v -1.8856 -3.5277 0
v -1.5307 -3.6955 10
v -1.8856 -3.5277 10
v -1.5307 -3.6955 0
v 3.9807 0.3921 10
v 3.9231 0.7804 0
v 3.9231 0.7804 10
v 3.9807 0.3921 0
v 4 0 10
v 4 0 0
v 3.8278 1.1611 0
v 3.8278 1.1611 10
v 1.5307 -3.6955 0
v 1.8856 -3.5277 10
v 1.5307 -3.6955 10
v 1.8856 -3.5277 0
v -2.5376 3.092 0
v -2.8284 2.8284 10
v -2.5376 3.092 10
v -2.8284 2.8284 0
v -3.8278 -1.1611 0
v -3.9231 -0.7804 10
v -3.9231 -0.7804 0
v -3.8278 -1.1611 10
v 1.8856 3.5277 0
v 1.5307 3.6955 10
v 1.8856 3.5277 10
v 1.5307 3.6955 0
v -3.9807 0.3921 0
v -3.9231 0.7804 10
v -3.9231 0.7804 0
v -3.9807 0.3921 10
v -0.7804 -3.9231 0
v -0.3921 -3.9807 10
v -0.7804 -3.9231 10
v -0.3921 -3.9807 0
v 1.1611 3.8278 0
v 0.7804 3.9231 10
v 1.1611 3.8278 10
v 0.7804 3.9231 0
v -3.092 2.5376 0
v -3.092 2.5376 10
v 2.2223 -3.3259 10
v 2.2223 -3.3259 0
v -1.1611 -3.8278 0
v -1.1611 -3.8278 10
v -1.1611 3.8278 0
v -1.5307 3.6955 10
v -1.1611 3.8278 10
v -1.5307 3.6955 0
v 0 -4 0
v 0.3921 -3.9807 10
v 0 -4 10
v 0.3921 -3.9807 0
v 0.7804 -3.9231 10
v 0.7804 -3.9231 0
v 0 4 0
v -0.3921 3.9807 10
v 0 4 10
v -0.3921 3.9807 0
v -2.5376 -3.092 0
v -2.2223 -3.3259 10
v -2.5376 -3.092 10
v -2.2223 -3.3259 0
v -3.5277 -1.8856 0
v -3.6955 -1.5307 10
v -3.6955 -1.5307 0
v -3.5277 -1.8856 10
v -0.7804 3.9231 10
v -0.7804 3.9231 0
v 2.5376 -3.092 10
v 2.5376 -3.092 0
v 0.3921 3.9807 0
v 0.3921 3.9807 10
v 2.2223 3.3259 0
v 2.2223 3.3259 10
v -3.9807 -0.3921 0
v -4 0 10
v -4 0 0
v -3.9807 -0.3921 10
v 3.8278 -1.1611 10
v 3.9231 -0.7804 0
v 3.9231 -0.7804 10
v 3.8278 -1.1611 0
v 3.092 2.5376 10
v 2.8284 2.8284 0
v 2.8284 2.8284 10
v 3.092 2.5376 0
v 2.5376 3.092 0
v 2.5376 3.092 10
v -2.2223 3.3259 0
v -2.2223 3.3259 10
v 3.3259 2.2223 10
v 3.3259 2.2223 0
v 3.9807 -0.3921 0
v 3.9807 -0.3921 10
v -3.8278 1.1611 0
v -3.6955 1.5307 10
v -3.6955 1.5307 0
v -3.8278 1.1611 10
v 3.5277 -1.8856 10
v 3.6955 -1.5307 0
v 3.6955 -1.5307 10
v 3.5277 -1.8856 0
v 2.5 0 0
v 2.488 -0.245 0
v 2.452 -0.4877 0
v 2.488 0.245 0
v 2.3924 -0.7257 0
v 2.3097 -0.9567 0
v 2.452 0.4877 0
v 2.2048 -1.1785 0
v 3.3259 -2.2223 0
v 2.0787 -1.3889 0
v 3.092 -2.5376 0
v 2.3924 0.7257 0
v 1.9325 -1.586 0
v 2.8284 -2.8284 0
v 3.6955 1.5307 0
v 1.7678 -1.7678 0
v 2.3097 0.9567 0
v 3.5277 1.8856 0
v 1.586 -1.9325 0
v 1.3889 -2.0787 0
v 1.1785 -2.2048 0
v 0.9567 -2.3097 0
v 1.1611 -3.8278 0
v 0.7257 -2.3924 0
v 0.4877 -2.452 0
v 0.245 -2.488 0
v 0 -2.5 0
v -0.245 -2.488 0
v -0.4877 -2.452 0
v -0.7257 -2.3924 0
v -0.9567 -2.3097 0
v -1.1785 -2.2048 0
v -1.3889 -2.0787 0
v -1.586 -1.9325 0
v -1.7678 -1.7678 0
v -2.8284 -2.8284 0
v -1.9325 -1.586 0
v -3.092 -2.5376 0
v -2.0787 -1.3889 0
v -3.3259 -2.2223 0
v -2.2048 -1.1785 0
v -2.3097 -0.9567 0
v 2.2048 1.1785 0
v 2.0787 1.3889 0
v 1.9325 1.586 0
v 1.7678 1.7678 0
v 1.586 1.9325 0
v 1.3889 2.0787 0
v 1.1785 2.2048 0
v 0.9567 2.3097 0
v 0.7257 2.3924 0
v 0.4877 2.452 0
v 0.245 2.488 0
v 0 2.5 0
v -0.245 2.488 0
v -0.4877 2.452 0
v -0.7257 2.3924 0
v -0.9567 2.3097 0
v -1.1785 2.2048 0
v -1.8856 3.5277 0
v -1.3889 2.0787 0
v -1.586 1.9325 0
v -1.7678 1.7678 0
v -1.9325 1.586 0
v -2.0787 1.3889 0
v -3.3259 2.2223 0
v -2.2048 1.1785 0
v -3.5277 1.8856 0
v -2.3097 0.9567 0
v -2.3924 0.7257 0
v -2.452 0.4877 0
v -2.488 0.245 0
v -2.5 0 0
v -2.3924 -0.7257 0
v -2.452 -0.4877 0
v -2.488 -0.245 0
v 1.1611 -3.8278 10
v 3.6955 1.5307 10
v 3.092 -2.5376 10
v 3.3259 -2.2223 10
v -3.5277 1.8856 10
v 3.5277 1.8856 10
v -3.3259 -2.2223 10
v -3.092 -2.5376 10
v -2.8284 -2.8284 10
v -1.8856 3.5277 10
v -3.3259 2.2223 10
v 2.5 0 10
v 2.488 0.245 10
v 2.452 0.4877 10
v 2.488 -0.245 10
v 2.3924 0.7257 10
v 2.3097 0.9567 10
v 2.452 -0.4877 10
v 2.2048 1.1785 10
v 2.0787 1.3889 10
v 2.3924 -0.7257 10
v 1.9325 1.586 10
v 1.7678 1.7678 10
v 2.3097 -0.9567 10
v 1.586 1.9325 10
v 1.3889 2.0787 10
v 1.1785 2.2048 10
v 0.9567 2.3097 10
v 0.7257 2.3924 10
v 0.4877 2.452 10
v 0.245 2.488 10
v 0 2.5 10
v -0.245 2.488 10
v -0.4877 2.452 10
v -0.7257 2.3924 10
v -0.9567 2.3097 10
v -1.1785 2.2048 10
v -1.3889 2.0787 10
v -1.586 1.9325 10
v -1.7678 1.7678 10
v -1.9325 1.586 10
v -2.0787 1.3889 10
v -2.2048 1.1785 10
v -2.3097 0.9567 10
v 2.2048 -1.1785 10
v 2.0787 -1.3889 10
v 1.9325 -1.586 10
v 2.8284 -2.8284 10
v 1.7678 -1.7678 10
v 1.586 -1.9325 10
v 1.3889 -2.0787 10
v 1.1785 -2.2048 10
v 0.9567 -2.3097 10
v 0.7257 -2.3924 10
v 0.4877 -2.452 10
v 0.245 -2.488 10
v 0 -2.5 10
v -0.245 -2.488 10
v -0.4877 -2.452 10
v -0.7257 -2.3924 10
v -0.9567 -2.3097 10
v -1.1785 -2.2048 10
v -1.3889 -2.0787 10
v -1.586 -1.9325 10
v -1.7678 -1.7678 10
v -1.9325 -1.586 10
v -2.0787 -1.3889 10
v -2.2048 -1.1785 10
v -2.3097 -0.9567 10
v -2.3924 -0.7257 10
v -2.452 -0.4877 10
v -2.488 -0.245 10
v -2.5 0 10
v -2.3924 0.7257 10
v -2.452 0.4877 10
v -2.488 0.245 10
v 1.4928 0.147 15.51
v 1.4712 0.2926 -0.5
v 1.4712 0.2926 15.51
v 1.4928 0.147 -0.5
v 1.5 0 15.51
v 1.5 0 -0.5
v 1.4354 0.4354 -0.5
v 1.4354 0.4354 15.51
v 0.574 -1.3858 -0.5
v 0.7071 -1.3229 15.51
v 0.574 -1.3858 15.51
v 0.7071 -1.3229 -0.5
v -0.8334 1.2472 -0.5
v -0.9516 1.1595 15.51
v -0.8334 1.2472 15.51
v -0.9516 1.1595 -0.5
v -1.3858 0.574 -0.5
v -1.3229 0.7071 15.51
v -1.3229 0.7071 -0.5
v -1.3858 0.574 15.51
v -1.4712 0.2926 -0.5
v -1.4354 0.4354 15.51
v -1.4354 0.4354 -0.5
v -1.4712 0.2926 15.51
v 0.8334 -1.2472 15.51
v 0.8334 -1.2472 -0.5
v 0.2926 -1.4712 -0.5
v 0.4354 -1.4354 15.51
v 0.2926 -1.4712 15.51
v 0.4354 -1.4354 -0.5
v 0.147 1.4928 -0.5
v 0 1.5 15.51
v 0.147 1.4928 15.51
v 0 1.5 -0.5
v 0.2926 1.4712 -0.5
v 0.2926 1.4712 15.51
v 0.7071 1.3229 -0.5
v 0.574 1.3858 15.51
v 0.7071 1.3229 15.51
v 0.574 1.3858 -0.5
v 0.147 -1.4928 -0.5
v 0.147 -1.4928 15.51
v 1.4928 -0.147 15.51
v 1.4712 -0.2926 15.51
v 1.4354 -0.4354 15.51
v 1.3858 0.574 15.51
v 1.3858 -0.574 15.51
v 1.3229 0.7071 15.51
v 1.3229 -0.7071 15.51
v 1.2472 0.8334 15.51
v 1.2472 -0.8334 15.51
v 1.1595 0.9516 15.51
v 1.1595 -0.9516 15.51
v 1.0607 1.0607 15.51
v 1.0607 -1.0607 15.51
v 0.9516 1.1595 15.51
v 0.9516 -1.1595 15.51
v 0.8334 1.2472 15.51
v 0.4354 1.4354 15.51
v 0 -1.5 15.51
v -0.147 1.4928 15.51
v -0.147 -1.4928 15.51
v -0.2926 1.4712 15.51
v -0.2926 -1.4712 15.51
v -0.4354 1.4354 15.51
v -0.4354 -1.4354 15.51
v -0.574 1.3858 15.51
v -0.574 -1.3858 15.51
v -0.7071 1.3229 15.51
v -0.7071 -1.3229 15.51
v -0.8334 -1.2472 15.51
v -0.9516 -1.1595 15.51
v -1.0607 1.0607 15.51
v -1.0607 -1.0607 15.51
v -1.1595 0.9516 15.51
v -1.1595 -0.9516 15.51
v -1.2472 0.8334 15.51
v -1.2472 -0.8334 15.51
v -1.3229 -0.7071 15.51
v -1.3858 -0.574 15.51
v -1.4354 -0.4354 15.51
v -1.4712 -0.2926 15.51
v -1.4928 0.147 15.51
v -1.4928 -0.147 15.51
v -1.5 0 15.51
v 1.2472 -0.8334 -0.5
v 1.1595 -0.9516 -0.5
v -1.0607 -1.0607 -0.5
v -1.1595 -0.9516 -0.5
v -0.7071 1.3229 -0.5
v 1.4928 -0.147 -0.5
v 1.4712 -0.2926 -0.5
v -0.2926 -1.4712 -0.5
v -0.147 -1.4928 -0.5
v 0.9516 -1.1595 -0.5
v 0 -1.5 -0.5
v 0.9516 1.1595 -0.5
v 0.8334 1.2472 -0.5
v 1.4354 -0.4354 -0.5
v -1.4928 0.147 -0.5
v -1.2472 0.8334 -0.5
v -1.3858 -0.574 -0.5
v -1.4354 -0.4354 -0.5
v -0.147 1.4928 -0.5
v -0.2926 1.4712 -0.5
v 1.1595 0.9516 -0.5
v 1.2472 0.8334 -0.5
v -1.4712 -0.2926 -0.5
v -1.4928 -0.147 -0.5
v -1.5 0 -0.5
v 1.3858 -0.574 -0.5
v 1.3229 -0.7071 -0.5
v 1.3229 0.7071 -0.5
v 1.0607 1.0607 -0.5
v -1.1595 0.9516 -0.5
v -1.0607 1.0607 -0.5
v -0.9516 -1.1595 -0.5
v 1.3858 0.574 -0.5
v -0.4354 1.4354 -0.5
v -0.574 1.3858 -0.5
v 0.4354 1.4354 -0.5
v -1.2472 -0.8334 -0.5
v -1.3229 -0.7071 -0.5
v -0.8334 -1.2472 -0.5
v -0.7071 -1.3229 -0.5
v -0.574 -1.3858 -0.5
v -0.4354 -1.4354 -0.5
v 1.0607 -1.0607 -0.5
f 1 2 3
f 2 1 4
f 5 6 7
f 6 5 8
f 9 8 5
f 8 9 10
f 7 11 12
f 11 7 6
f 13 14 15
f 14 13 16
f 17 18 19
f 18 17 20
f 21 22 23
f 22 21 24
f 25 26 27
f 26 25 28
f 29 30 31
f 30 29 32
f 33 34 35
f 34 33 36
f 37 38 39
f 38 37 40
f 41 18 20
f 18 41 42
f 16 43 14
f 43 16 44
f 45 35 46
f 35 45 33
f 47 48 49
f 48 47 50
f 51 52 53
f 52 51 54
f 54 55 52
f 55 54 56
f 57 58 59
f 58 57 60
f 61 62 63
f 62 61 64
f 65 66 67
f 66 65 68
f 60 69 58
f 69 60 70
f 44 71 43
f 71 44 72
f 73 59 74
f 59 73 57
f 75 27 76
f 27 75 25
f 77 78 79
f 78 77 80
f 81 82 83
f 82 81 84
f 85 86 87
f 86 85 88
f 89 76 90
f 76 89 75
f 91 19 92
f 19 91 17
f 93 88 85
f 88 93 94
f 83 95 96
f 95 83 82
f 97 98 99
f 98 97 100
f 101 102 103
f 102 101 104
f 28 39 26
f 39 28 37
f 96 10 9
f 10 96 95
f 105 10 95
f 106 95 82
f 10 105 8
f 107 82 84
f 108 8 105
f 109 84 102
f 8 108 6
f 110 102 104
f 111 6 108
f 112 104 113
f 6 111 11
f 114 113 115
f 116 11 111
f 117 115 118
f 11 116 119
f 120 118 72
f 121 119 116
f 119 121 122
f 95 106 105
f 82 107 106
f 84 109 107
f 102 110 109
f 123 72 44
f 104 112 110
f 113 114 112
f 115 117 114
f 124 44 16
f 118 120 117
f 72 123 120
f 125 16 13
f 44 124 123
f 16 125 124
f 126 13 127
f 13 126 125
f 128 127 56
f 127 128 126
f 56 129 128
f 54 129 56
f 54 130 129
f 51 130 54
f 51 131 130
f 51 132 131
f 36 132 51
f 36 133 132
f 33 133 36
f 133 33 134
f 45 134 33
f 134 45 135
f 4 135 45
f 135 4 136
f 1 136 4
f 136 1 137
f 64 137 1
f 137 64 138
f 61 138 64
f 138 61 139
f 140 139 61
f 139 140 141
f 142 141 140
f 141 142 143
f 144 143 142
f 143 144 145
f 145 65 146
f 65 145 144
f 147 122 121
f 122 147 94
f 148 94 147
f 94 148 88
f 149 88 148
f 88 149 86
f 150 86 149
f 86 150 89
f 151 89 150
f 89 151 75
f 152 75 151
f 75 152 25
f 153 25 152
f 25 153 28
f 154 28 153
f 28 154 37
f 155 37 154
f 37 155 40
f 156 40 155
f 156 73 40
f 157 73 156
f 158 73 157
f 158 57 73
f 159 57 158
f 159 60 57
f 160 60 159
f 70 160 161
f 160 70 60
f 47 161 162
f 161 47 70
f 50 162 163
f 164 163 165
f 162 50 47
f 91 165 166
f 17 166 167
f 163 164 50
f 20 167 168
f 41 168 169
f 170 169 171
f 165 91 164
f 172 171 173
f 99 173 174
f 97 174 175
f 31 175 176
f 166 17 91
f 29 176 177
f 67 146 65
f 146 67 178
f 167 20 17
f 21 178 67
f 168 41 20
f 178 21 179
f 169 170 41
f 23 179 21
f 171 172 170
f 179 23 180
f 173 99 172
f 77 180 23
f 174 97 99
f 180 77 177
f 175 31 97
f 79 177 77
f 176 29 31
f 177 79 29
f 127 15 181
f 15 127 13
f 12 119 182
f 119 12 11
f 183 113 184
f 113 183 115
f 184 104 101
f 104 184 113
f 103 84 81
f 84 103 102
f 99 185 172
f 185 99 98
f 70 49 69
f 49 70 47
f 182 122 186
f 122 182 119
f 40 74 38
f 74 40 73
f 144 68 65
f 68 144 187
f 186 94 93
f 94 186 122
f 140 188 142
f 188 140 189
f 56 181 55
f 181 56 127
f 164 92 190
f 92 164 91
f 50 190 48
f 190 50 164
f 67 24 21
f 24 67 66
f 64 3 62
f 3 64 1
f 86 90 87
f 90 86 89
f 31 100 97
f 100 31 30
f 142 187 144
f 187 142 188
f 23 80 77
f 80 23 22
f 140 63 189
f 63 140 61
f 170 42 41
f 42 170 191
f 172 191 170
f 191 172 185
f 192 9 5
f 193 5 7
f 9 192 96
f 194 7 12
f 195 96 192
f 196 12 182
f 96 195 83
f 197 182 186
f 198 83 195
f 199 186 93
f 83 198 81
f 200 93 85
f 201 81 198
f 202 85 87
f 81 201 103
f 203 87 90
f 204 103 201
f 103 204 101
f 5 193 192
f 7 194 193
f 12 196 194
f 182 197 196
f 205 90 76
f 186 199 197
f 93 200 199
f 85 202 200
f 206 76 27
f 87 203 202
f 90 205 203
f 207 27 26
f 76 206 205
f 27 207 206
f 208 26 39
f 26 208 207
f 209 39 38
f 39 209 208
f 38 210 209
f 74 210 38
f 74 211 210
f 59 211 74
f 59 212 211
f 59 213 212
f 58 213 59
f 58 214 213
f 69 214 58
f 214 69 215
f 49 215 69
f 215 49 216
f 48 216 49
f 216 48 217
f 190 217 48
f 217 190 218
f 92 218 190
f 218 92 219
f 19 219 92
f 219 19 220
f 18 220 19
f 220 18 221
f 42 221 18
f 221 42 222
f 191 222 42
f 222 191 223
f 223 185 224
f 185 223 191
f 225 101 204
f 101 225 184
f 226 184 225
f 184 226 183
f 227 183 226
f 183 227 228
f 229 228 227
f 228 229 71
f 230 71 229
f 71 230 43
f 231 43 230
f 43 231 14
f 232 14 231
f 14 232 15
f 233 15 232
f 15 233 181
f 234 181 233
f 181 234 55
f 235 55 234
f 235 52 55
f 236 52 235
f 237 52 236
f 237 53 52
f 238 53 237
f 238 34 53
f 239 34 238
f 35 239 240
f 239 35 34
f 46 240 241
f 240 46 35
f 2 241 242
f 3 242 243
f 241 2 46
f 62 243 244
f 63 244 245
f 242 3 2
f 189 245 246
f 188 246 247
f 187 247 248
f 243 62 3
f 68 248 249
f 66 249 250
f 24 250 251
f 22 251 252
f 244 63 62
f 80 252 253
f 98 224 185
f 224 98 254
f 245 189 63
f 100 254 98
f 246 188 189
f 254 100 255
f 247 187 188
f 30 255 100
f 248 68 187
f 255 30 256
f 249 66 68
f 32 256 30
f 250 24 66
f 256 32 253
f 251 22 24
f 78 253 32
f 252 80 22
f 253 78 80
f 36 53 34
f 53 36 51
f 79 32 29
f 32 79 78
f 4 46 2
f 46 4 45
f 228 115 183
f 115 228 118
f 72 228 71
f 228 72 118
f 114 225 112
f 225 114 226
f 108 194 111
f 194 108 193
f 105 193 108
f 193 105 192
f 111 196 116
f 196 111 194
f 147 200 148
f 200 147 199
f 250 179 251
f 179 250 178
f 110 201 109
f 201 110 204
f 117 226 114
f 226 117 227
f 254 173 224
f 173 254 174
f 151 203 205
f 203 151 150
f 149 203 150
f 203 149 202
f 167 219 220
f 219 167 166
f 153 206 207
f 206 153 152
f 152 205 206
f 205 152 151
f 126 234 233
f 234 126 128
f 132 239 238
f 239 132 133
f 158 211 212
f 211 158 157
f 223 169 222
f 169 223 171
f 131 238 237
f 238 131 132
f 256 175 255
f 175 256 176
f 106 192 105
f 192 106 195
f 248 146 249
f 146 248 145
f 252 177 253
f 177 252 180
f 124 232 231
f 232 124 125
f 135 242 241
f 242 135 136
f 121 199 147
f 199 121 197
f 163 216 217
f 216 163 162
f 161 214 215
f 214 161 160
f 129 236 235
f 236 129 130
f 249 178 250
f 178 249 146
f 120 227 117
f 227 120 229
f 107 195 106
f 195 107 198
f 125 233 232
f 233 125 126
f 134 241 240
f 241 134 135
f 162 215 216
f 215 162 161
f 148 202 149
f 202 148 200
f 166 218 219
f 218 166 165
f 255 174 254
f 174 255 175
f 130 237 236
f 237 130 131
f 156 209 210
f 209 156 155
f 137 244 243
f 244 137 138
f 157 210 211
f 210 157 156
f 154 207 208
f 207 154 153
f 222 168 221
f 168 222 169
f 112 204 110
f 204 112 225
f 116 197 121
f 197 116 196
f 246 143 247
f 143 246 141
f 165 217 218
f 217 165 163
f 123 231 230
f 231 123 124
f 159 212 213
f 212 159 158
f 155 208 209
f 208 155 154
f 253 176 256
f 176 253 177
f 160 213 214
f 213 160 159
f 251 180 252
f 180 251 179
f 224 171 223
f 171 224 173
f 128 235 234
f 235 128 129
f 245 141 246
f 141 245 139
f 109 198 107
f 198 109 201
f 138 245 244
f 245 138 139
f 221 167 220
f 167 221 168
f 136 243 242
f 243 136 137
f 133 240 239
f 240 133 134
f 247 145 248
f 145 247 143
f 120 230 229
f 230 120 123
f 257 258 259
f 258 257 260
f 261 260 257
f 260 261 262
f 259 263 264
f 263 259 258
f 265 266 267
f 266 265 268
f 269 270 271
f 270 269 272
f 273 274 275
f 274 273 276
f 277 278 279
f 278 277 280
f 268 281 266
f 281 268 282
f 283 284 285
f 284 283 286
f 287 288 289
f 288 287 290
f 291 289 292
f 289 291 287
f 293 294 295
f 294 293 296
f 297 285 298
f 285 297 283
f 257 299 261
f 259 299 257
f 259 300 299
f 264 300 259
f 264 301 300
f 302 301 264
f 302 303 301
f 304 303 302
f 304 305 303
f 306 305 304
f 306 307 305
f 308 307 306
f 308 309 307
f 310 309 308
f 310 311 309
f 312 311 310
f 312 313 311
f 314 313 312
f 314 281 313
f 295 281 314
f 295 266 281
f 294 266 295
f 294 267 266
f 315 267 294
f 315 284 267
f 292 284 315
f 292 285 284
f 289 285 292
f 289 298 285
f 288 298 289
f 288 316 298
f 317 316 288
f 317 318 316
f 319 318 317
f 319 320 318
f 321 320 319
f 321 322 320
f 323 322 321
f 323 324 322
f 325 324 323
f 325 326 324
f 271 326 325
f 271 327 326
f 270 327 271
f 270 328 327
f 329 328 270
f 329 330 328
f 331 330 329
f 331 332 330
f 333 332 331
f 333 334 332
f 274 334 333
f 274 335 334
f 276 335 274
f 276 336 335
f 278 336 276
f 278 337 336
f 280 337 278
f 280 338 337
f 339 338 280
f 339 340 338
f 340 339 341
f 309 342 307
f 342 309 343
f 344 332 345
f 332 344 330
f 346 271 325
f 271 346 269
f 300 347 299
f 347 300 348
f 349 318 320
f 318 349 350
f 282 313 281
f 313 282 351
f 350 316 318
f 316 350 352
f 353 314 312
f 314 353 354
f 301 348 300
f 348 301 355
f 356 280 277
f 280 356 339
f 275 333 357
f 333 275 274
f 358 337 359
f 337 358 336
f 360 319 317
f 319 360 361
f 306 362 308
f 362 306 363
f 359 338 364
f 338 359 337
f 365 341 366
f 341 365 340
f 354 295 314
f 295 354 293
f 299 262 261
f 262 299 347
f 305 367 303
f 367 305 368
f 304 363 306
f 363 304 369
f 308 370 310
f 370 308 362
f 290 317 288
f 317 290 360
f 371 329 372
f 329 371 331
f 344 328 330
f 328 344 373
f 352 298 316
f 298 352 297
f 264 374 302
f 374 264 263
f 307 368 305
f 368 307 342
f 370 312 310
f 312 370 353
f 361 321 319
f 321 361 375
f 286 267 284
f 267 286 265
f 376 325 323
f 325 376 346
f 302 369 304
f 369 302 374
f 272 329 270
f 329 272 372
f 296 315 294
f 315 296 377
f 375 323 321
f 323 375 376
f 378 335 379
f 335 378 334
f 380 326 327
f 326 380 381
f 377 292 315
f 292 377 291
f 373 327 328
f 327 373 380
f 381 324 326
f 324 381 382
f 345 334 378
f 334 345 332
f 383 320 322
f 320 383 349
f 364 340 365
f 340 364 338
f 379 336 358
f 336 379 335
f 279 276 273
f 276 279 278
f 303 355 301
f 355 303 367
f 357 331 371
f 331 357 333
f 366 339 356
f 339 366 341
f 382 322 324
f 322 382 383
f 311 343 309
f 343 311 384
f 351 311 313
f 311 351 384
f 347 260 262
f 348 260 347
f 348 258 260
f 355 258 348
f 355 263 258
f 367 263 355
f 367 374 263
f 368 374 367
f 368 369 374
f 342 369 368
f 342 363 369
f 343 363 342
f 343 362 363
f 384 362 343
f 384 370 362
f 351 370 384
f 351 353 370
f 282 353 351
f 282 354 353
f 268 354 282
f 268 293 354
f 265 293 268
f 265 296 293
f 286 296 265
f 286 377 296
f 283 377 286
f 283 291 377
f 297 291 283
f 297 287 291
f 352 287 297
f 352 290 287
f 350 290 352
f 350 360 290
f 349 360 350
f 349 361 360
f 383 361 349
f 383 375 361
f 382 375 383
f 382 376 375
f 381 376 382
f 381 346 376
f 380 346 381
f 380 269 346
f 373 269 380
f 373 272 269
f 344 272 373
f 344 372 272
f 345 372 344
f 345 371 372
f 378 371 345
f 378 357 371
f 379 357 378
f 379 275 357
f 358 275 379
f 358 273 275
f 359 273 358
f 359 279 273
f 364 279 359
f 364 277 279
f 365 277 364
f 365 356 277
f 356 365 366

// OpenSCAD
// Straight hose-barb reducer
// Print orientation: standing upright along Z, barbs pointing up

// ---------- Dimensions ----------
tube_od1     = 8;    // first tubing outer diameter
tube_id1     = 5;    // first tubing inner diameter
tube_od2     = 5;    // second tubing outer diameter
tube_id2     = 5;    // second tubing inner diameter
bore_d       = 3;    // through-bore diameter
barb_len     = 10;   // barb height (first tubing)
collar_d     = 12;   // collar diameter
collar_len   = 5;    // collar length
overlap      = 0.5;  // barb/collar overlap for a clean union

$fn = 64;

// ---------- Model ----------
union() {
    // First tubing + barb
    difference() {
        cylinder(h = barb_len, d = tube_od1);
        translate([0, 0, -overlap])
            cylinder(h = barb_len + 2 * overlap, d = tube_id1);
    }

    // Second tubing (embedded in the collar)
    translate([0, 0, collar_len - overlap])
        difference() {
            cylinder(h = overlap + 0.01, d = tube_od2);
            translate([0, 0, -overlap])
                cylinder(h = overlap + 1, d = tube_id2);
        }

    // Through-bore
    translate([0, 0, -overlap])
        cylinder(h = barb_len + collar_len + 2 * overlap + 0.01, d = bore_d);
}
